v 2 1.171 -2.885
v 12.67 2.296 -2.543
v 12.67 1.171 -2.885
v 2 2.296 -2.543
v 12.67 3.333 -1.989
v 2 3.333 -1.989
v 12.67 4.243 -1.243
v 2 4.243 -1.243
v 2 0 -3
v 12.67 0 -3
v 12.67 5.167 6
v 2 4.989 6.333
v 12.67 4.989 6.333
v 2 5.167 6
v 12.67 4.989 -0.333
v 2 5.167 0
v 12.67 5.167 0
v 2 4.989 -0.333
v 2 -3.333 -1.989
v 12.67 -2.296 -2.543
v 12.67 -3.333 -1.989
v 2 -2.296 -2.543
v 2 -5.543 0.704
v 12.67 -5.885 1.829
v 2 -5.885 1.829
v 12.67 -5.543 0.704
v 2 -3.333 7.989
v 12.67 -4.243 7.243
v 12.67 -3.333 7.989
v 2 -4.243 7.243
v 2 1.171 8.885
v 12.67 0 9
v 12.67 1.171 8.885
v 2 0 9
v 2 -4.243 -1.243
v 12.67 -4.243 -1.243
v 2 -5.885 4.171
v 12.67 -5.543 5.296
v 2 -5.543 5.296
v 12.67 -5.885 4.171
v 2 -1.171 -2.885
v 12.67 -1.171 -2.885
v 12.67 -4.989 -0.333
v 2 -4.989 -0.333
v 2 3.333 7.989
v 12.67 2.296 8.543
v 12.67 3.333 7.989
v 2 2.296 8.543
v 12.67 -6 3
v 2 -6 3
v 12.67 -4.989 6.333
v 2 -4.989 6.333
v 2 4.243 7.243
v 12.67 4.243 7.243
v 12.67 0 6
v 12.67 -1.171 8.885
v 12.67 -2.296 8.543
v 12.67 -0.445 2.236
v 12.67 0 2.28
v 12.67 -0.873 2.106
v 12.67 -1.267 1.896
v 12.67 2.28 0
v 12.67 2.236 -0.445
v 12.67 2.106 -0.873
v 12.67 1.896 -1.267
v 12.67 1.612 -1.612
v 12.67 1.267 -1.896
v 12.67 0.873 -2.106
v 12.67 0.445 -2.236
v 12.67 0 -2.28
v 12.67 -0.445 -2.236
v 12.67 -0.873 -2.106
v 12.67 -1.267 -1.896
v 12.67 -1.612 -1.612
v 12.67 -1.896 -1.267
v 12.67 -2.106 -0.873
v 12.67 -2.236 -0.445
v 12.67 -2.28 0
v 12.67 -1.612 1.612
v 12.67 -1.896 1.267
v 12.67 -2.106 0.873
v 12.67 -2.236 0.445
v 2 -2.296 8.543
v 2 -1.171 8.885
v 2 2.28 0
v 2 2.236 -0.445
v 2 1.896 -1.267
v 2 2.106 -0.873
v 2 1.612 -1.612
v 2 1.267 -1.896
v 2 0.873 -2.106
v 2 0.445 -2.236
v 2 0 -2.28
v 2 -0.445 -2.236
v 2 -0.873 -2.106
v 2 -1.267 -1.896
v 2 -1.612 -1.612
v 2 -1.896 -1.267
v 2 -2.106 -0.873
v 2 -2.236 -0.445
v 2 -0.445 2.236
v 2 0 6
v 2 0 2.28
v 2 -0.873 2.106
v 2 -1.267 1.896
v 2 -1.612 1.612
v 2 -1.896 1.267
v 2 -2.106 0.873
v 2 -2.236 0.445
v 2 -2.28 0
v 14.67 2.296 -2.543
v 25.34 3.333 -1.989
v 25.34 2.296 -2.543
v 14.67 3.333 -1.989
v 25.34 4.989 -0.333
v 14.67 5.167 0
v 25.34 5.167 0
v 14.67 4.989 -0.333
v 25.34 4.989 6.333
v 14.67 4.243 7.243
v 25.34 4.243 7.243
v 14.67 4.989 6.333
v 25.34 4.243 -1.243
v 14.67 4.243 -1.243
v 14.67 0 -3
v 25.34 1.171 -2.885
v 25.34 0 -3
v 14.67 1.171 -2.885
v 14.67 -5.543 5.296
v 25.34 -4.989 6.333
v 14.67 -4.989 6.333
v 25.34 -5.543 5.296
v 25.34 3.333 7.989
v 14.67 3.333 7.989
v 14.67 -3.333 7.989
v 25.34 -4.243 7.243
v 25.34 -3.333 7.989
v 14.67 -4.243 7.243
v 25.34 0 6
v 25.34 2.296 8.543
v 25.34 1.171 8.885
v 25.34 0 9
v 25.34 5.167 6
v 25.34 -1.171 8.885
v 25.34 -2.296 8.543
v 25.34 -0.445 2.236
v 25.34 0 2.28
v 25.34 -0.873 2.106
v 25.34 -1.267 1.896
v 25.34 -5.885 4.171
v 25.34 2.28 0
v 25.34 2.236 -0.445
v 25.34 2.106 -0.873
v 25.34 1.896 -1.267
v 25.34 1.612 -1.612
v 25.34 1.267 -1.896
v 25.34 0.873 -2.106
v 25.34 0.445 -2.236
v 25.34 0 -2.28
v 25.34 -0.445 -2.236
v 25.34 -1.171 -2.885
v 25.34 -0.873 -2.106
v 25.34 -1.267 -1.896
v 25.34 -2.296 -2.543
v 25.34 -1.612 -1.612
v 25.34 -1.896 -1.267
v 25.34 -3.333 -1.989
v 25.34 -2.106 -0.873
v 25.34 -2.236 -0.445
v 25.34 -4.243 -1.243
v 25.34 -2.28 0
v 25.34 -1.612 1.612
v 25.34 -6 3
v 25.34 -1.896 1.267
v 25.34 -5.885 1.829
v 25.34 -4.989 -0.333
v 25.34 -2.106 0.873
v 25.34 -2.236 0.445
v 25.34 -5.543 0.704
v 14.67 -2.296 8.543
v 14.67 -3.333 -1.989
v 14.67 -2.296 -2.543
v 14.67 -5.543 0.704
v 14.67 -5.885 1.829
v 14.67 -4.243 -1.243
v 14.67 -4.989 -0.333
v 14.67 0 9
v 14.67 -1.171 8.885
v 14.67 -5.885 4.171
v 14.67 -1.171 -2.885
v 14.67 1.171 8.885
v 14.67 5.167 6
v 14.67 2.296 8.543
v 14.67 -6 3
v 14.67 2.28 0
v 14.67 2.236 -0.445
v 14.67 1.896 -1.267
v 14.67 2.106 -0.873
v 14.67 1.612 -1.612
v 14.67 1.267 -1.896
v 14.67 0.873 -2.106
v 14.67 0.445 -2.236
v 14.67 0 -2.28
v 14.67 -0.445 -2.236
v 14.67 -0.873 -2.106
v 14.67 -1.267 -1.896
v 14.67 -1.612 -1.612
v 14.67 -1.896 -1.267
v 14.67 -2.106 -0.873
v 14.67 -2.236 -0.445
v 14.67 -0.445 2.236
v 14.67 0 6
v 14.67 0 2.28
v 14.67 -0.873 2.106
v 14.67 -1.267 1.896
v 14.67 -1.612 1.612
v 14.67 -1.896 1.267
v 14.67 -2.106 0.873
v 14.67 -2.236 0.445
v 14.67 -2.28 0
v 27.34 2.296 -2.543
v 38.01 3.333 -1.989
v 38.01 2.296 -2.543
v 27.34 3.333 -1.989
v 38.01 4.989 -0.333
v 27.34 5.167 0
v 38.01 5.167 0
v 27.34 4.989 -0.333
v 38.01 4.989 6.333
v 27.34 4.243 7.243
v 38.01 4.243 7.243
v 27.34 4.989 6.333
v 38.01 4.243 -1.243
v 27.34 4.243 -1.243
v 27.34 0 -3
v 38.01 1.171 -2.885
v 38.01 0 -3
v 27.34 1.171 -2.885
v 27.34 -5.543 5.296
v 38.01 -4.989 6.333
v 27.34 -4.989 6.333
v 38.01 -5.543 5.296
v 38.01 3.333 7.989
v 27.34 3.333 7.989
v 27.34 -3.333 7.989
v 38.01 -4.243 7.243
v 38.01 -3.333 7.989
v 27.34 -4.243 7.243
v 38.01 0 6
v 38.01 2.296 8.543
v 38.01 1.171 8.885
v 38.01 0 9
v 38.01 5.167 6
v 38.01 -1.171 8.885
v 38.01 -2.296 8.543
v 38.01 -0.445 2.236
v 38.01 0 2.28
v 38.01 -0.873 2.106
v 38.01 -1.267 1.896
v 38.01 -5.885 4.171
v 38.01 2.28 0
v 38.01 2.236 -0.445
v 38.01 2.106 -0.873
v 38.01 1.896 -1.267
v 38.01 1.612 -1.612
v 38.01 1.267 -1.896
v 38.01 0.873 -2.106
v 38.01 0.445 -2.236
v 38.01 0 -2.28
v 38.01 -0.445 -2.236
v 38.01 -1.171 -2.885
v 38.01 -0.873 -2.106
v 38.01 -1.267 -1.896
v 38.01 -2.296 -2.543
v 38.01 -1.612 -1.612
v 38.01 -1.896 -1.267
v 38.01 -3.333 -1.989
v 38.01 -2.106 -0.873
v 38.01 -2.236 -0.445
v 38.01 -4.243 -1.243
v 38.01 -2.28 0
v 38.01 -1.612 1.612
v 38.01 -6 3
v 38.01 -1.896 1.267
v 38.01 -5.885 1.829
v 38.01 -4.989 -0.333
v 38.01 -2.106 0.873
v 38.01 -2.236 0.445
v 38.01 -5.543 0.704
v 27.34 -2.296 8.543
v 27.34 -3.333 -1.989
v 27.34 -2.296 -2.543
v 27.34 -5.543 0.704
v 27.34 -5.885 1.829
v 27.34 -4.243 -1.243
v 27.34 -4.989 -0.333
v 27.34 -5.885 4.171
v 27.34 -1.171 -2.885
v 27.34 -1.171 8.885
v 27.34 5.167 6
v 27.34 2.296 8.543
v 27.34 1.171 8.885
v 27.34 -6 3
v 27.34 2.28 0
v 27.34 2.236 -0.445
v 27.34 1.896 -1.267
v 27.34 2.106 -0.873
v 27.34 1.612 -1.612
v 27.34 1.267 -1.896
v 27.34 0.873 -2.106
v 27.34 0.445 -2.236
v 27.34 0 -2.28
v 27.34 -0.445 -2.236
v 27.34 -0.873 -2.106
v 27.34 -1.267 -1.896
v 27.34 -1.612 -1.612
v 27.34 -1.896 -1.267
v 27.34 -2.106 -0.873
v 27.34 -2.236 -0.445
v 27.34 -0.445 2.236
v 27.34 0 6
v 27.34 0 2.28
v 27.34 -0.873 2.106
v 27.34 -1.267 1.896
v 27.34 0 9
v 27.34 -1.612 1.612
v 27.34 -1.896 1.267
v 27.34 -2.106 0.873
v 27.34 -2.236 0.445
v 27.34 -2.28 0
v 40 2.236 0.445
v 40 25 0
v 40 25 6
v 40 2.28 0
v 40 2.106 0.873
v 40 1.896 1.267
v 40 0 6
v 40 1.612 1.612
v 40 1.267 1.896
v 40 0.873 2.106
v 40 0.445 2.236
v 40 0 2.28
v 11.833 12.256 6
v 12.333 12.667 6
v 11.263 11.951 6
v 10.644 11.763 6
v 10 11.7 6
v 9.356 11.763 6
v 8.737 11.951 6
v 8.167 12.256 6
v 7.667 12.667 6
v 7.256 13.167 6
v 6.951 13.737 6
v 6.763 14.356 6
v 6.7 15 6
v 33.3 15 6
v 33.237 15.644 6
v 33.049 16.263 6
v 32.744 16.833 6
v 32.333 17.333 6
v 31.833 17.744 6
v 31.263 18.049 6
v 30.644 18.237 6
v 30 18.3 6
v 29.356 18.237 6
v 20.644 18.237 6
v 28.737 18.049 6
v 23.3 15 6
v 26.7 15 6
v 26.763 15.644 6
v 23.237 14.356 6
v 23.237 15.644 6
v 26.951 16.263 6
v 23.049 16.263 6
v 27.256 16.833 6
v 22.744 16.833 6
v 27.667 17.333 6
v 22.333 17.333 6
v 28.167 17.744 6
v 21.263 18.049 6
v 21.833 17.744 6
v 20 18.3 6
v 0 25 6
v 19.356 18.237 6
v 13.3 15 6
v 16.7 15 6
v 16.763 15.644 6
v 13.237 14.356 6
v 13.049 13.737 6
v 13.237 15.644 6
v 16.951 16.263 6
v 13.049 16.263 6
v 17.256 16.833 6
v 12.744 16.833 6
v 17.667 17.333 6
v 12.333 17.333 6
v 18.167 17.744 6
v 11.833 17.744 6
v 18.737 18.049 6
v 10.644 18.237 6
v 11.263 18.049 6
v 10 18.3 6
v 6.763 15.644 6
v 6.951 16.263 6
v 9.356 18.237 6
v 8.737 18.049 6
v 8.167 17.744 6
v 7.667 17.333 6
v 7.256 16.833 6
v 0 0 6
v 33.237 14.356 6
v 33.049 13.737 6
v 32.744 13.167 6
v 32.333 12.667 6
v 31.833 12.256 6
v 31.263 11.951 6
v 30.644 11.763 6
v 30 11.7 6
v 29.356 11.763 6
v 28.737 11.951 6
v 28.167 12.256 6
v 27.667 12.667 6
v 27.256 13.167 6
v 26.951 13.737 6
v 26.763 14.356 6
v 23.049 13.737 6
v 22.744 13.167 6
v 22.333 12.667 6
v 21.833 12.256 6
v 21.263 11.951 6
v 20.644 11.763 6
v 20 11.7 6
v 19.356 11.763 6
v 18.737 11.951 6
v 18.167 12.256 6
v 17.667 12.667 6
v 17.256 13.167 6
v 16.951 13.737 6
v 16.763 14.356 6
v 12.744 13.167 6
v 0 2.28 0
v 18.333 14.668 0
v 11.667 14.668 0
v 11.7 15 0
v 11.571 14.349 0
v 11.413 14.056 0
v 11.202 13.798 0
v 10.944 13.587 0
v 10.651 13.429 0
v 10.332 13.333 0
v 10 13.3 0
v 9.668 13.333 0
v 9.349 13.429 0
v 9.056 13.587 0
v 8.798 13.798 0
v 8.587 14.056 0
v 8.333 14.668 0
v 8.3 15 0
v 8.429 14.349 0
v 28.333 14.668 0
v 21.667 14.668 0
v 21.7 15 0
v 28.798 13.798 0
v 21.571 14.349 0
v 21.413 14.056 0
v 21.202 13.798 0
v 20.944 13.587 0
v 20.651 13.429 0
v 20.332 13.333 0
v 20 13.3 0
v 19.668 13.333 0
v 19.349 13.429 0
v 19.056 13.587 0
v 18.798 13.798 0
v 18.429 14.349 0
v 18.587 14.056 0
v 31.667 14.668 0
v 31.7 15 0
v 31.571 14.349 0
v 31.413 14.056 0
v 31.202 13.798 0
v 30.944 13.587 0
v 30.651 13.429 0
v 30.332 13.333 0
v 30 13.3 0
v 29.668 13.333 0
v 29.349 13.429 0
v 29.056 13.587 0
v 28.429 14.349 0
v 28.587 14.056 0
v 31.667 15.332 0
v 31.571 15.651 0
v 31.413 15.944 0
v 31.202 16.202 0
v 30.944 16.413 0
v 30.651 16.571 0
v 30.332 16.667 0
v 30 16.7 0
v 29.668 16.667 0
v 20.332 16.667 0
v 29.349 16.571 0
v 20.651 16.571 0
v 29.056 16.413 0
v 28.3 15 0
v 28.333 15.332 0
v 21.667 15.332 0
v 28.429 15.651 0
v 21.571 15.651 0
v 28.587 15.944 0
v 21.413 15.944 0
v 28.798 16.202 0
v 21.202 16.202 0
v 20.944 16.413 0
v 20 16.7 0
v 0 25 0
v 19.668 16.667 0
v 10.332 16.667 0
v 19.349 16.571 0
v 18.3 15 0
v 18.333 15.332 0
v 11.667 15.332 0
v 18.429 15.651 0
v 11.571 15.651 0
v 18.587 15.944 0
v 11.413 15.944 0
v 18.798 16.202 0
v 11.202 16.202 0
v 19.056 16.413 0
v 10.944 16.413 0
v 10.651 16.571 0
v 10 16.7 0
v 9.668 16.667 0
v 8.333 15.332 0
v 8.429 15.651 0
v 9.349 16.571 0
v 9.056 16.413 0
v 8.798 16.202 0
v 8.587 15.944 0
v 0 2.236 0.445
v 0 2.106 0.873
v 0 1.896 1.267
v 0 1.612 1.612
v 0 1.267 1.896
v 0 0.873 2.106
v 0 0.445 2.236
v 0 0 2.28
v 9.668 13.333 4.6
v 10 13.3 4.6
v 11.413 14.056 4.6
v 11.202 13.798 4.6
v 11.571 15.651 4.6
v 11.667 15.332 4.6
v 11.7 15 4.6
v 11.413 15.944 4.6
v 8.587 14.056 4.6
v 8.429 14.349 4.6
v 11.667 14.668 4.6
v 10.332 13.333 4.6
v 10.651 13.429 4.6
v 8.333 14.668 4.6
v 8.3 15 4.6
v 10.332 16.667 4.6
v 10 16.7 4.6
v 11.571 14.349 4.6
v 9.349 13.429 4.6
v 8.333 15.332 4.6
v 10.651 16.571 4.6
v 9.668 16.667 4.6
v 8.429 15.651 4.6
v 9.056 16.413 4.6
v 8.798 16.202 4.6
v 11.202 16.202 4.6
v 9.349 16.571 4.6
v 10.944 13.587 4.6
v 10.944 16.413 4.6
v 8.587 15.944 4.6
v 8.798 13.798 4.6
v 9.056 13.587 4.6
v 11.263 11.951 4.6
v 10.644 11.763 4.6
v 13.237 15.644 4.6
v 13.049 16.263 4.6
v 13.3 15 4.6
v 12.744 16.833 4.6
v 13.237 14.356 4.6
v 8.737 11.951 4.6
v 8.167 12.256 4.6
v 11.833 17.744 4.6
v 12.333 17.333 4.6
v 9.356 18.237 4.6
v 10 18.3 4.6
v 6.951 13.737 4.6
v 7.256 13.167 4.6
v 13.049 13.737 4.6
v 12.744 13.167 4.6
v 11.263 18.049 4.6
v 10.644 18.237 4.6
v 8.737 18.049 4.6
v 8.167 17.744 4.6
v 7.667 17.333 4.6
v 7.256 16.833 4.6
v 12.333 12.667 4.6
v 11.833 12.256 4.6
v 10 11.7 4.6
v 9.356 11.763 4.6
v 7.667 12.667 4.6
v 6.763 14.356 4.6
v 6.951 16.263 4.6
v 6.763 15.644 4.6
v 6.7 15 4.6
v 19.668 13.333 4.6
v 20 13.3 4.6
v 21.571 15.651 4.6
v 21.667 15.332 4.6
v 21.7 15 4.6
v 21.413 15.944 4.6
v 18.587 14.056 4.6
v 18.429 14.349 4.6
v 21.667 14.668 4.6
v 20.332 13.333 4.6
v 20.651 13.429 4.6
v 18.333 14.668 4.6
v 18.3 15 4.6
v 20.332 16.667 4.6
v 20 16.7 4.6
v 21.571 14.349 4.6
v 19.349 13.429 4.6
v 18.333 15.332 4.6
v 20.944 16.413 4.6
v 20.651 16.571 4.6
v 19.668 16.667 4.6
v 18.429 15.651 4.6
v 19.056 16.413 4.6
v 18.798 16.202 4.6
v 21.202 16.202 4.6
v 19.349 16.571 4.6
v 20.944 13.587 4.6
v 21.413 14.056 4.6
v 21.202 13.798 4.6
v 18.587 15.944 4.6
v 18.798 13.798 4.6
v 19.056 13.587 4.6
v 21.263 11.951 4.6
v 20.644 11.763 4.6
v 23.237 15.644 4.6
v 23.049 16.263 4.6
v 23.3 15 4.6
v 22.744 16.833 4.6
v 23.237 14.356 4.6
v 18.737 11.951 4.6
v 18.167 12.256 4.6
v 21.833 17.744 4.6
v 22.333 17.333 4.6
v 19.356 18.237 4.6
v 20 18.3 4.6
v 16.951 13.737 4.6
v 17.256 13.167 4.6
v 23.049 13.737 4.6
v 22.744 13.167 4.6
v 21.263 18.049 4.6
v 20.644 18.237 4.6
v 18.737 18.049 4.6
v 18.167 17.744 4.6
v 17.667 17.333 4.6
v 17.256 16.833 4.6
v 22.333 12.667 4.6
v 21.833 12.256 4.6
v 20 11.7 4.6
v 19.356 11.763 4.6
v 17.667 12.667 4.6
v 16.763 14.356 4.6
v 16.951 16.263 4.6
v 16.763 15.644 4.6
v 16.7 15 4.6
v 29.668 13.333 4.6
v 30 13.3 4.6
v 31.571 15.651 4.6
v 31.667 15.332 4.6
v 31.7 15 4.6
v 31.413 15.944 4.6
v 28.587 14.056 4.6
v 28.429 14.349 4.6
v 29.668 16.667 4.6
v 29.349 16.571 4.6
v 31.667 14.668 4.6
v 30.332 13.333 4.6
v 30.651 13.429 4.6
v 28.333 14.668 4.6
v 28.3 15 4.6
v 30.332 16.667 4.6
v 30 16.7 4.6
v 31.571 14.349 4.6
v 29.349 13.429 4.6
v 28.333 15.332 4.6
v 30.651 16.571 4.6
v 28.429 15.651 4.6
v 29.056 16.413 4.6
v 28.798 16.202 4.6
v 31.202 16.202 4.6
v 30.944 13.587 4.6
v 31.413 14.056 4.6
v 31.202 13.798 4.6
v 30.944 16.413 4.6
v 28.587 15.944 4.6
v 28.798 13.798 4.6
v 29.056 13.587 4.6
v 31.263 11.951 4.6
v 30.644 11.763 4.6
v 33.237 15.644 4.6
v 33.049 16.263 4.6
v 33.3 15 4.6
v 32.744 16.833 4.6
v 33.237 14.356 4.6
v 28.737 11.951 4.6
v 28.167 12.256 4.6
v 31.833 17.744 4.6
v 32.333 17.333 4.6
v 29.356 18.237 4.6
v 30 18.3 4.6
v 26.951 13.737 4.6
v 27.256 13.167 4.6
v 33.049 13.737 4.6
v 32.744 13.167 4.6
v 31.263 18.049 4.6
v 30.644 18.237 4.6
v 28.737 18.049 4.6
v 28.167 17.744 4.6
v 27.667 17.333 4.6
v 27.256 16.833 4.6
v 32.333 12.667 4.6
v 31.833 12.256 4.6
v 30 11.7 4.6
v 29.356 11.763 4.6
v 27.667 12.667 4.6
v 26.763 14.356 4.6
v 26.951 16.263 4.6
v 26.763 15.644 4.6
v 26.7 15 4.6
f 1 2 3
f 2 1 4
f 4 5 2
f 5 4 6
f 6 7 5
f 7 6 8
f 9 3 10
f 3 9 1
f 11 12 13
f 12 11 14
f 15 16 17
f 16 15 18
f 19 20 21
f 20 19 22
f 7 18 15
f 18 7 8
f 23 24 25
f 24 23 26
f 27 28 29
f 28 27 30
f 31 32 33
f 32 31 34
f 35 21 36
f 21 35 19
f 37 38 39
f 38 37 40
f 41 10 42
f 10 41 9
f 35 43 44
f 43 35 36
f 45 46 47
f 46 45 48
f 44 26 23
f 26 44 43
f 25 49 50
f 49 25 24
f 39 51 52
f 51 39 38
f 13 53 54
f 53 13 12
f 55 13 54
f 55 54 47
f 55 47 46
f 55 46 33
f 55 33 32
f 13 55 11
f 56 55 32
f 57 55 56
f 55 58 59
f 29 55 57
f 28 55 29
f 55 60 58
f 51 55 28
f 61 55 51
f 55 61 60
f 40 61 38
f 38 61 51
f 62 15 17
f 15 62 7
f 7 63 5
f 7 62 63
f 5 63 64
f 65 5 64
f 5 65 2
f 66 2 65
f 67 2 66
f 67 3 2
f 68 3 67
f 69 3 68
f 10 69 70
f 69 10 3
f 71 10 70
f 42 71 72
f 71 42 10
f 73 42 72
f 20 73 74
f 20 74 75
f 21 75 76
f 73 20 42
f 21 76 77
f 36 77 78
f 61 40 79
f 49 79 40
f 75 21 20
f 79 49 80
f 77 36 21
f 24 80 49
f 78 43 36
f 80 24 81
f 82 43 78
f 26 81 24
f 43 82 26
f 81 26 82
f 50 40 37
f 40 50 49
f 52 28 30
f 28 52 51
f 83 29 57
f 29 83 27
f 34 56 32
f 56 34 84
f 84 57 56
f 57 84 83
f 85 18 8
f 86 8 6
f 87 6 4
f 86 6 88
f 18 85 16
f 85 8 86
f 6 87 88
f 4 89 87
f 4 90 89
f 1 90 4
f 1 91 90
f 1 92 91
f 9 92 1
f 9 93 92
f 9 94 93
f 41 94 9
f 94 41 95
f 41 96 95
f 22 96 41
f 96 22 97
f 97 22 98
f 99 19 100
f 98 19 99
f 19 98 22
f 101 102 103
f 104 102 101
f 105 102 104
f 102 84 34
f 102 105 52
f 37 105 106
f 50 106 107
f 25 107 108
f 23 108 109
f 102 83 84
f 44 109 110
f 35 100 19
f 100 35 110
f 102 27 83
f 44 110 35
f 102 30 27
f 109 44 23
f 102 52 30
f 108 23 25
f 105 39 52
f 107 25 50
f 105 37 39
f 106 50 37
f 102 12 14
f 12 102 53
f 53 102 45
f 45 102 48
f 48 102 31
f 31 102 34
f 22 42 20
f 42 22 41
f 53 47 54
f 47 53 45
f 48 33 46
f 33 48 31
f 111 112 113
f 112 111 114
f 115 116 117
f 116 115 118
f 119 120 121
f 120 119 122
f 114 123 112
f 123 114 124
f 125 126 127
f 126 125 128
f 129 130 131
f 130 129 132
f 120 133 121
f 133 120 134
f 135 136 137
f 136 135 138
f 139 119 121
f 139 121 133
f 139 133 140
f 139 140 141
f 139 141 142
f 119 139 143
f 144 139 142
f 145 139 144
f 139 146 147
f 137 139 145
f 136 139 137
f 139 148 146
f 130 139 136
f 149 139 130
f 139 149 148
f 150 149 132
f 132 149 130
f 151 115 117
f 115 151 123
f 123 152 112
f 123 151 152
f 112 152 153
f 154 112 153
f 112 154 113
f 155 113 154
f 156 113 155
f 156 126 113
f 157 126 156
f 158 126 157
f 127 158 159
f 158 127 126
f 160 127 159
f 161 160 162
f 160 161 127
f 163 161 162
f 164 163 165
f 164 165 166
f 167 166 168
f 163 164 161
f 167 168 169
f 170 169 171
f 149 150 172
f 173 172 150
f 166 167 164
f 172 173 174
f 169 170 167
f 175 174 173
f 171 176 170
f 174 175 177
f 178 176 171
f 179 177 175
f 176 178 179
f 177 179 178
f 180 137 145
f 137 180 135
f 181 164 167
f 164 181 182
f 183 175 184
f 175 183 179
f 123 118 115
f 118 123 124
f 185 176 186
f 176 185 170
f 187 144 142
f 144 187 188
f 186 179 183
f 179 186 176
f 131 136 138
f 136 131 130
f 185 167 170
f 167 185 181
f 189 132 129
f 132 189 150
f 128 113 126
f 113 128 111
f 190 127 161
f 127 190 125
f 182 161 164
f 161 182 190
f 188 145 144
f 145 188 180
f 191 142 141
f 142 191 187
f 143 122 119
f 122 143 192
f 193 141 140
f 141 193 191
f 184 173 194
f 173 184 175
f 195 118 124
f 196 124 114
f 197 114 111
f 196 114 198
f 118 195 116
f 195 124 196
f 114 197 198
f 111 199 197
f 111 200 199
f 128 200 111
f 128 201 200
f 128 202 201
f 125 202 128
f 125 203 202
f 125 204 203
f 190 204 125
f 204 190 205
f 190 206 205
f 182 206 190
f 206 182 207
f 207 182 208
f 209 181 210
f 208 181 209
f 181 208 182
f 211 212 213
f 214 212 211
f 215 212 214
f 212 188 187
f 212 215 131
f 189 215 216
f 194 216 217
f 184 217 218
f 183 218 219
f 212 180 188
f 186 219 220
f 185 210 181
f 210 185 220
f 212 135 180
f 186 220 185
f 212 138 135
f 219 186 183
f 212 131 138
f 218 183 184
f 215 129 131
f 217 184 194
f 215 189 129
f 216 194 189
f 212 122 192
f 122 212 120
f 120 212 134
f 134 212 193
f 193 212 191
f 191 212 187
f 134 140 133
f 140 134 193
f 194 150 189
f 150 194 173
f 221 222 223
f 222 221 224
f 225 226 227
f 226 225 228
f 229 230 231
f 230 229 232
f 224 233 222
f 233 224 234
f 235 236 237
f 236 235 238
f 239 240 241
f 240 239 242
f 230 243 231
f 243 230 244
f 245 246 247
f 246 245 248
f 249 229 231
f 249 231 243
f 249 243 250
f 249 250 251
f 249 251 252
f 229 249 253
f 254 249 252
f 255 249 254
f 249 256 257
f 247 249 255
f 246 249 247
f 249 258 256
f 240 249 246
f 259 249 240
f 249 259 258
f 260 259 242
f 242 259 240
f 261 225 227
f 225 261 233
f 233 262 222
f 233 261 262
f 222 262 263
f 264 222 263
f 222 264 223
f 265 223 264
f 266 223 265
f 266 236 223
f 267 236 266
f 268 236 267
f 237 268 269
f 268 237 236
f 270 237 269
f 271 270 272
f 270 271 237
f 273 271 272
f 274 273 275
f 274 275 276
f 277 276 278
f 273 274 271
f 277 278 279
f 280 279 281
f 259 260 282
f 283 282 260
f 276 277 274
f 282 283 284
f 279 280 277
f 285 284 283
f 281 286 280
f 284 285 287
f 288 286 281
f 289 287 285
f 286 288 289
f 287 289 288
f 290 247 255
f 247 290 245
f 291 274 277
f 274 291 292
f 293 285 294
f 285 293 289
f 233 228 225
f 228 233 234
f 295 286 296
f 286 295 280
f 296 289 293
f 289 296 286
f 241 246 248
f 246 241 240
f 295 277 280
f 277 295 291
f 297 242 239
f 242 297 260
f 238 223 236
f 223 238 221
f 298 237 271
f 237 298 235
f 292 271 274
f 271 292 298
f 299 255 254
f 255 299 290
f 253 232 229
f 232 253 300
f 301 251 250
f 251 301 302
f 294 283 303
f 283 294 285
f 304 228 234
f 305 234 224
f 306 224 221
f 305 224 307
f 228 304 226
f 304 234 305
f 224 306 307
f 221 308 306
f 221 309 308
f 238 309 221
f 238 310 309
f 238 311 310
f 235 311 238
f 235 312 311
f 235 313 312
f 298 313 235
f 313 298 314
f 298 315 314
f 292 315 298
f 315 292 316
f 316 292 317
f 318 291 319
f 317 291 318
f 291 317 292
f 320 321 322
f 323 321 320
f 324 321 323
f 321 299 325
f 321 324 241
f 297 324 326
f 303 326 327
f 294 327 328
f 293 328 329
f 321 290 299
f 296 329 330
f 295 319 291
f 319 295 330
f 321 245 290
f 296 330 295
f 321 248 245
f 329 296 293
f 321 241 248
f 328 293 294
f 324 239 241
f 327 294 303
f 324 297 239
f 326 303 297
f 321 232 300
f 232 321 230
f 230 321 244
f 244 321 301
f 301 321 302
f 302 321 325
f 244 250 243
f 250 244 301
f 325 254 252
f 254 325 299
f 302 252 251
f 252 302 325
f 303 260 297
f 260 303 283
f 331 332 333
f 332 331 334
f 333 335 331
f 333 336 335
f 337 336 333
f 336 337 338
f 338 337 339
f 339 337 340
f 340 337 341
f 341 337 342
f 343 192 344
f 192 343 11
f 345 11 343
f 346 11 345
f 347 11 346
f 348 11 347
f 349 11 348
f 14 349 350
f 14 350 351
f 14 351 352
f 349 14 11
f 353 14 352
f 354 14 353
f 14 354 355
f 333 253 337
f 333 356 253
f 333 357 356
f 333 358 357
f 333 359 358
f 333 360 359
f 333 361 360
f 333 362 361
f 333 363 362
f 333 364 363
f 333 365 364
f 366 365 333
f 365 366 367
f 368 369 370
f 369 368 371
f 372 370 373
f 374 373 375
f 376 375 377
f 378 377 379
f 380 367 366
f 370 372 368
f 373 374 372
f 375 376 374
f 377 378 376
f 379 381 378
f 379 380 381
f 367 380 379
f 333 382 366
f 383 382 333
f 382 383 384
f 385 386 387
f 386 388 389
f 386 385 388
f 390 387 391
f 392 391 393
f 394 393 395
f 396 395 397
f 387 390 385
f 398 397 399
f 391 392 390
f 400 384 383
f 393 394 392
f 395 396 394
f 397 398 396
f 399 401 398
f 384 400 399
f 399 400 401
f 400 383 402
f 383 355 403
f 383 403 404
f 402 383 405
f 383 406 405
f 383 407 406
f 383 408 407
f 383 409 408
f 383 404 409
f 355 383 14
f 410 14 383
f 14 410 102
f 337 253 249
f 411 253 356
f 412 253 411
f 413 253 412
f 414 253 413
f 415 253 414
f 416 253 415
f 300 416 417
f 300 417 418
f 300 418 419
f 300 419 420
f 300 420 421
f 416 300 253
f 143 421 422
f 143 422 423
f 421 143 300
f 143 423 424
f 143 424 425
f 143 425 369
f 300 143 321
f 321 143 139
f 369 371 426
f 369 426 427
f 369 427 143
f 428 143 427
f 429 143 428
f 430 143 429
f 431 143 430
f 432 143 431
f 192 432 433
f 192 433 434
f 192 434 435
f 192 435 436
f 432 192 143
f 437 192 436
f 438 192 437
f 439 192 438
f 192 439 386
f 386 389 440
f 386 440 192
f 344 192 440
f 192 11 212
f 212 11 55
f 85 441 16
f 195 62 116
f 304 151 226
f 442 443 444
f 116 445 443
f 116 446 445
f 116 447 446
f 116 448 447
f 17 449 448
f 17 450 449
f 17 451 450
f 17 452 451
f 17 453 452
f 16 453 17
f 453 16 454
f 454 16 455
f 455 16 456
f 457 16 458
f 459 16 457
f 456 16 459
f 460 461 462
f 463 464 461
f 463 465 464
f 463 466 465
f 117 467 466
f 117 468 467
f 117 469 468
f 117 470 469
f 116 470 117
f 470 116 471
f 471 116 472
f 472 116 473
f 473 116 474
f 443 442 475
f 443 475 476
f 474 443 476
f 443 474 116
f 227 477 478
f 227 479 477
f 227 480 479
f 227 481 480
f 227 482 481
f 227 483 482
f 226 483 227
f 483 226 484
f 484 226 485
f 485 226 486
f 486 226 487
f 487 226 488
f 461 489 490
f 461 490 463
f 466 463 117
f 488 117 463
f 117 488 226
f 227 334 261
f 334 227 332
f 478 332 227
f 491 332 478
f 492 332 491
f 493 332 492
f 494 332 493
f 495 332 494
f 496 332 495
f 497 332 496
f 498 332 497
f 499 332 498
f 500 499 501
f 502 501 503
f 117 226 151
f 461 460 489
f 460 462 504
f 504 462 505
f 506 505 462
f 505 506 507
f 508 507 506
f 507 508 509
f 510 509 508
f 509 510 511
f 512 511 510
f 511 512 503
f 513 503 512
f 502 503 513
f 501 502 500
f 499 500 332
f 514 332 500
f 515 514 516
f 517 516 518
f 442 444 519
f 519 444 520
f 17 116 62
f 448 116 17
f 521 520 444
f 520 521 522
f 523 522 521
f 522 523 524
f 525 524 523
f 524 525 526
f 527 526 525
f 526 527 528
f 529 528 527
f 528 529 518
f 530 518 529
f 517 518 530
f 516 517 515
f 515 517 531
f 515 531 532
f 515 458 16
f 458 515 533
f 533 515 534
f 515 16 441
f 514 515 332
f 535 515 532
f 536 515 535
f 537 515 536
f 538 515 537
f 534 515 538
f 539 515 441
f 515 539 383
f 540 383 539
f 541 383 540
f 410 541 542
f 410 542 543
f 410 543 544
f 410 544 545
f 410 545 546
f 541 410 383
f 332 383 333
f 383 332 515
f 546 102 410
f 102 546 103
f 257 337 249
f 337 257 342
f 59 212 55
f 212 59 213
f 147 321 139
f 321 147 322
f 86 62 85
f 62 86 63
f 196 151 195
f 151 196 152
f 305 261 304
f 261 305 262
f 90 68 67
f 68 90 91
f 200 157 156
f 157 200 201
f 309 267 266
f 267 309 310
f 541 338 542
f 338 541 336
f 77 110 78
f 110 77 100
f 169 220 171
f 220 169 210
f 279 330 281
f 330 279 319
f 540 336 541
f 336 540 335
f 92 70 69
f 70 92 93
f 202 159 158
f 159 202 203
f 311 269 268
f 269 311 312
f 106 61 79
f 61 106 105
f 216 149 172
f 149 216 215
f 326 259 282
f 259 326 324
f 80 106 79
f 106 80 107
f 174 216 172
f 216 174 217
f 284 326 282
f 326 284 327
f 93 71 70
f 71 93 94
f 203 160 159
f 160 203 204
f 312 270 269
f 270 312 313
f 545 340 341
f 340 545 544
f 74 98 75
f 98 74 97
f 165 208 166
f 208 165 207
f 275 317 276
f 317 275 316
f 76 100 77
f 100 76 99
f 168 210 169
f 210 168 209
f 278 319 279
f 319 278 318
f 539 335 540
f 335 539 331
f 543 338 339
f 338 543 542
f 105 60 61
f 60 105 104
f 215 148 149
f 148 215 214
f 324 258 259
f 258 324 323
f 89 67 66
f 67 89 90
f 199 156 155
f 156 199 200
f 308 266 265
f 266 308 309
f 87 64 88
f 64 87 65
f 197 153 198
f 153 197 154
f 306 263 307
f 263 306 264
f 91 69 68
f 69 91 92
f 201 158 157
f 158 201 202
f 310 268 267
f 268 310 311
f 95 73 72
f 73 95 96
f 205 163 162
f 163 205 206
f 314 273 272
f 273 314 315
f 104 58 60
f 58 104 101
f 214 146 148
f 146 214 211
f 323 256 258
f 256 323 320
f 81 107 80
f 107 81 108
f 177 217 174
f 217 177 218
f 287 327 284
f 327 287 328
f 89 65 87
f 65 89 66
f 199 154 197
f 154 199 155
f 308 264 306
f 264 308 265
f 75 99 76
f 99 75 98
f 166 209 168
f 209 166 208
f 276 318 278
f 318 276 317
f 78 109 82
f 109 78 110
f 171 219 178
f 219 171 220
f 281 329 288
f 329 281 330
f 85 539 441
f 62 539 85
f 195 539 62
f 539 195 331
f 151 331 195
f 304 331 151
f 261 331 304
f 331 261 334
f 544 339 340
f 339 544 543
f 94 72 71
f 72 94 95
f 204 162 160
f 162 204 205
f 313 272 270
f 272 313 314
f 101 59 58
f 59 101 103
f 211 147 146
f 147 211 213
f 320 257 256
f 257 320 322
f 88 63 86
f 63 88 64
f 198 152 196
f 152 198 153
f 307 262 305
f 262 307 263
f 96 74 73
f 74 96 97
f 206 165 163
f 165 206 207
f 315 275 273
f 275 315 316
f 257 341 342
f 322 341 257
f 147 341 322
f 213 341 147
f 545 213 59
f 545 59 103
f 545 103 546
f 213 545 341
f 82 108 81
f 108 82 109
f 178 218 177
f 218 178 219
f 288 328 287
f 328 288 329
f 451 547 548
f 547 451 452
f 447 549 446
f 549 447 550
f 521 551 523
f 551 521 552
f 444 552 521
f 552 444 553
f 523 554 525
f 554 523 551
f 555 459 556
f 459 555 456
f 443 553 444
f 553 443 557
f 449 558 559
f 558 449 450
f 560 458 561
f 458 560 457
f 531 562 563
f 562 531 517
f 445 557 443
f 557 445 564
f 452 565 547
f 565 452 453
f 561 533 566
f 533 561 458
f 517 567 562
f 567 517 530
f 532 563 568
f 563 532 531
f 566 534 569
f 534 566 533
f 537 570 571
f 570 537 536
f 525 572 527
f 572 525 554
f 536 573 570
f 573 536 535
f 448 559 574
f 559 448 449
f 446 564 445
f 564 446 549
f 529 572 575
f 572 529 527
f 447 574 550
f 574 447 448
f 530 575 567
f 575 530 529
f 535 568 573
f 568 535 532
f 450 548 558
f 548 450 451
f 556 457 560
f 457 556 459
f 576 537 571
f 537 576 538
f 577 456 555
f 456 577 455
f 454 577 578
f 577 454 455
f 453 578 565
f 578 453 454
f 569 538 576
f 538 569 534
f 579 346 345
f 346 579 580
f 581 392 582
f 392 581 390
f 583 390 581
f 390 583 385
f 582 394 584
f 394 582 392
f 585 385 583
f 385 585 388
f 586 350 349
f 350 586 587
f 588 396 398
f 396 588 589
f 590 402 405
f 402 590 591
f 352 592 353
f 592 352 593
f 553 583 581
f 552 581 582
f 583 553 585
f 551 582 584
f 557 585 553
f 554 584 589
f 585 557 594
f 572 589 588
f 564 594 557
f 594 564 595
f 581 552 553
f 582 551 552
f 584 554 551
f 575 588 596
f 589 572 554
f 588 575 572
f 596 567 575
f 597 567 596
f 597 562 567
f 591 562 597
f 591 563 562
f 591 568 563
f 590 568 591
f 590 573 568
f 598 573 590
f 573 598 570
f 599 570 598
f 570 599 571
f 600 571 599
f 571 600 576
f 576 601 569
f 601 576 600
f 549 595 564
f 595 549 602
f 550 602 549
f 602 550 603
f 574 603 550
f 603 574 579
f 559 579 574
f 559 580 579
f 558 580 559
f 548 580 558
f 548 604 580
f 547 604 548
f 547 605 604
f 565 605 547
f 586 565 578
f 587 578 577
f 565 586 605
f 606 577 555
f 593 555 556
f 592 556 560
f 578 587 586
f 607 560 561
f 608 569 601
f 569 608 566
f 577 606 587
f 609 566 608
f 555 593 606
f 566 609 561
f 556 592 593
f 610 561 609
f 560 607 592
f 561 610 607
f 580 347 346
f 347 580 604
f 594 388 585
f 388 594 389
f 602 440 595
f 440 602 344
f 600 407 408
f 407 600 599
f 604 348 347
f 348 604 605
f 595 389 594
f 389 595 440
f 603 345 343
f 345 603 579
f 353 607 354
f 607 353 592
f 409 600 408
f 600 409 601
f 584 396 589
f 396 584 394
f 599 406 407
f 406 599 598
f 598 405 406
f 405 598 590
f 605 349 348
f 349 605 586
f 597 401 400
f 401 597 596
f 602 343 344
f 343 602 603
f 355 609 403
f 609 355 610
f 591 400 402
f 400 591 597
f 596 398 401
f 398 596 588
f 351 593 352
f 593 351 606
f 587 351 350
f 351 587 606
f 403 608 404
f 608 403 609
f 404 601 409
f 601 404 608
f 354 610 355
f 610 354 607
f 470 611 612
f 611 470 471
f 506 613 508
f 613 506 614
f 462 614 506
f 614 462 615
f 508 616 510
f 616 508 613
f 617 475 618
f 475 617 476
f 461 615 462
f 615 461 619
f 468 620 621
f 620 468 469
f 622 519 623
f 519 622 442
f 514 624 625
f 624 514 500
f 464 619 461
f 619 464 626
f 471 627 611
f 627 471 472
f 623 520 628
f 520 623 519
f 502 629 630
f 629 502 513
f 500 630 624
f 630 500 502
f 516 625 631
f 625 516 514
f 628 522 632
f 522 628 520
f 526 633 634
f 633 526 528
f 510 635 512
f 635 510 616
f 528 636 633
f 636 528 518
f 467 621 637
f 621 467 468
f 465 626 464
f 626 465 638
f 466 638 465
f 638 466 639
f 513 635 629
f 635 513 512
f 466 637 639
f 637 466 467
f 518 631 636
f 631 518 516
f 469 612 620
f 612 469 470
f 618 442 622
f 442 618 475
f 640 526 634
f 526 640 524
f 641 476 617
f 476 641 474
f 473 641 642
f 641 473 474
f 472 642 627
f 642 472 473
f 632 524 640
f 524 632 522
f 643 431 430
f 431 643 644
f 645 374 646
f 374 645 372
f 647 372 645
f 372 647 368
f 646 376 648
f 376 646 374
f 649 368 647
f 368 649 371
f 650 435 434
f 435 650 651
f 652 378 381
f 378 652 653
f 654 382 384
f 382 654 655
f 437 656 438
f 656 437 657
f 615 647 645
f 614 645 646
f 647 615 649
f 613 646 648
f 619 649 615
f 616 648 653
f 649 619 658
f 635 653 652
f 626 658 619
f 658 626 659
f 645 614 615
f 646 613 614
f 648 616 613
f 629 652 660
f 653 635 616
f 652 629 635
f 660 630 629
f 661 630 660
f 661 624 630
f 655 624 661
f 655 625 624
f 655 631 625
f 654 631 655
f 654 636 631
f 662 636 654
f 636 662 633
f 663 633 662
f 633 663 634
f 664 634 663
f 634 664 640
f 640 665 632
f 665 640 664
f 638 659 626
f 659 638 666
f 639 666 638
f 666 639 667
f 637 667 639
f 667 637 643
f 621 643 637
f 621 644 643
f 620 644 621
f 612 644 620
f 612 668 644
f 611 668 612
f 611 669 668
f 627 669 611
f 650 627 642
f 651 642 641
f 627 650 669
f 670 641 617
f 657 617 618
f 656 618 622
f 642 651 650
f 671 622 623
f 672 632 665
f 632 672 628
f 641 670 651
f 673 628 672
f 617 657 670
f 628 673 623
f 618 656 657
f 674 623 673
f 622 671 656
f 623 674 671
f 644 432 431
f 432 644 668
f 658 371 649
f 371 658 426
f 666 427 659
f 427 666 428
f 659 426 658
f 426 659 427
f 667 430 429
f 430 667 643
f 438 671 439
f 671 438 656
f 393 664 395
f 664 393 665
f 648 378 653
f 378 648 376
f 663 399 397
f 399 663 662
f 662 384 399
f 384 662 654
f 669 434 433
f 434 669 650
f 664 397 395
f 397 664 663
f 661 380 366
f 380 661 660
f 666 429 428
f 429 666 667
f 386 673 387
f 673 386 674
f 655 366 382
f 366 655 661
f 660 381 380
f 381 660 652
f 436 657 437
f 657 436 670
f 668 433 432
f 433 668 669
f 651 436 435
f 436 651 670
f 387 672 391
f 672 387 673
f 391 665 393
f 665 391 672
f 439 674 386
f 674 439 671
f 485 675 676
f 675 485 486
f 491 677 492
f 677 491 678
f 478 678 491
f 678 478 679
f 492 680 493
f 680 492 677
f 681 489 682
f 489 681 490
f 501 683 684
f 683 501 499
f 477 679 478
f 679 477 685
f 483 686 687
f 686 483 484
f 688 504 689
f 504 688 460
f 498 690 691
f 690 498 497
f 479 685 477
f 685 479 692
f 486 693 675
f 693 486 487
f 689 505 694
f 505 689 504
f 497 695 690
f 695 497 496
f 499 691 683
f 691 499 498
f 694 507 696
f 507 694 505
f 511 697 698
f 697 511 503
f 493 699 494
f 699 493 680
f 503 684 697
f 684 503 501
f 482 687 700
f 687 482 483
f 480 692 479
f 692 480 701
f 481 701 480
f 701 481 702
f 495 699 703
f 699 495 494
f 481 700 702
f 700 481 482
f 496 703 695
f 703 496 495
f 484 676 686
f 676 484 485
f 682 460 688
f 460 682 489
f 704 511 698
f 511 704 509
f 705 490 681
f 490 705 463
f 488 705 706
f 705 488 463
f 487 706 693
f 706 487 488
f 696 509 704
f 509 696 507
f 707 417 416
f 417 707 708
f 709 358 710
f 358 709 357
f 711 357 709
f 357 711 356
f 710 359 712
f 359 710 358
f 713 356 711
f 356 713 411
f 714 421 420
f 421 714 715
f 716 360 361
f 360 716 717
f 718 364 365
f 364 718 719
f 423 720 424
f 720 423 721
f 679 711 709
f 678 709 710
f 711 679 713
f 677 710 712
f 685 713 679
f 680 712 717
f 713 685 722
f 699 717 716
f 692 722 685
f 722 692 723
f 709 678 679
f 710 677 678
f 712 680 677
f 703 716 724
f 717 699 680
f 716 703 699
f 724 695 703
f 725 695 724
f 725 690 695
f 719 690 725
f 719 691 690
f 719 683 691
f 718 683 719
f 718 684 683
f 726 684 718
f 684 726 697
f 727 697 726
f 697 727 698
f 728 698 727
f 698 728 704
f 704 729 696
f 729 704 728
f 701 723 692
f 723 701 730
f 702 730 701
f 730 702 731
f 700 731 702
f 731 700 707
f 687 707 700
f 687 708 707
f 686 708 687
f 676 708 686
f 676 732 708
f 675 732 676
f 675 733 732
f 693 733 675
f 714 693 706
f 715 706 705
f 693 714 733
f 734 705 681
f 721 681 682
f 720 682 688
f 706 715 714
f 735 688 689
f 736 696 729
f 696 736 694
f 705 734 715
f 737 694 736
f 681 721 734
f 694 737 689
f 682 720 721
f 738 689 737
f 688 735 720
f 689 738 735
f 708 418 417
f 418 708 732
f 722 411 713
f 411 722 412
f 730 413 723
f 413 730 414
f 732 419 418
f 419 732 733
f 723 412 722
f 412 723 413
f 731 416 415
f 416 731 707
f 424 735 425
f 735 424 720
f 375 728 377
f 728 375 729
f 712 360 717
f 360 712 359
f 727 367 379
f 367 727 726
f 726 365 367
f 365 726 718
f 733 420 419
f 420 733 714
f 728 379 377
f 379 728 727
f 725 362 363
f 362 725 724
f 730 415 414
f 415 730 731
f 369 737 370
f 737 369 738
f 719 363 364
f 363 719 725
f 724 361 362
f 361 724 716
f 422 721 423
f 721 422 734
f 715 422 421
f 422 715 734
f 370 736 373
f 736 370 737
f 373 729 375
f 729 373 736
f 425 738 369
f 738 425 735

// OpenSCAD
$fn = 32;

// ----------------------------------------------------------------------
// Hinge leaf: 40 x 31 x 12 mm
// ----------------------------------------------------------------------

// --- parameters (mm) ---
leaf_len = 40;            // leaf length, X
leaf_w = 25;              // leaf width, Y
leaf_t = 6;               // leaf thickness
knuckle_d = 12;           // knuckle diameter
knuckle_w = 10.67;        // knuckle width
knuckle_n = 3;            // number of knuckles
pin_d = 4.56;             // pin bore
gap = 2;                  // gap between the knuckles
screw_d = 3.4;            // screw clearance
cs_d = 6.6;               // countersink diameter
cs_h = 1.4;               // countersink depth

module leaf() {
  cube([leaf_len, leaf_w, leaf_t]);
}

module knuckles() {
  /* barrels sit on the leaf edge, the pin axis at half the leaf thickness */
  for (i = [0 : knuckle_n - 1])
    translate([gap + i * (knuckle_w + gap), 0, leaf_t * 0.5])
      rotate([0, 90, 0]) cylinder(h = knuckle_w, d = knuckle_d);
}

difference() {
  union() {
    leaf();
    knuckles();
  }
  rotate([0, 90, 0]) translate([0, 0, -1])
    cylinder(h = leaf_len + 2, d = pin_d);
  translate([10, leaf_w * 0.6, -1]) cylinder(h = leaf_t + 2, d = screw_d);
  translate([10, leaf_w * 0.6, leaf_t - cs_h]) cylinder(h = cs_h + 0.5, d = cs_d);
  translate([20, leaf_w * 0.6, -1]) cylinder(h = leaf_t + 2, d = screw_d);
  translate([20, leaf_w * 0.6, leaf_t - cs_h]) cylinder(h = cs_h + 0.5, d = cs_d);
  translate([30, leaf_w * 0.6, -1]) cylinder(h = leaf_t + 2, d = screw_d);
  translate([30, leaf_w * 0.6, leaf_t - cs_h]) cylinder(h = cs_h + 0.5, d = cs_d);
}
